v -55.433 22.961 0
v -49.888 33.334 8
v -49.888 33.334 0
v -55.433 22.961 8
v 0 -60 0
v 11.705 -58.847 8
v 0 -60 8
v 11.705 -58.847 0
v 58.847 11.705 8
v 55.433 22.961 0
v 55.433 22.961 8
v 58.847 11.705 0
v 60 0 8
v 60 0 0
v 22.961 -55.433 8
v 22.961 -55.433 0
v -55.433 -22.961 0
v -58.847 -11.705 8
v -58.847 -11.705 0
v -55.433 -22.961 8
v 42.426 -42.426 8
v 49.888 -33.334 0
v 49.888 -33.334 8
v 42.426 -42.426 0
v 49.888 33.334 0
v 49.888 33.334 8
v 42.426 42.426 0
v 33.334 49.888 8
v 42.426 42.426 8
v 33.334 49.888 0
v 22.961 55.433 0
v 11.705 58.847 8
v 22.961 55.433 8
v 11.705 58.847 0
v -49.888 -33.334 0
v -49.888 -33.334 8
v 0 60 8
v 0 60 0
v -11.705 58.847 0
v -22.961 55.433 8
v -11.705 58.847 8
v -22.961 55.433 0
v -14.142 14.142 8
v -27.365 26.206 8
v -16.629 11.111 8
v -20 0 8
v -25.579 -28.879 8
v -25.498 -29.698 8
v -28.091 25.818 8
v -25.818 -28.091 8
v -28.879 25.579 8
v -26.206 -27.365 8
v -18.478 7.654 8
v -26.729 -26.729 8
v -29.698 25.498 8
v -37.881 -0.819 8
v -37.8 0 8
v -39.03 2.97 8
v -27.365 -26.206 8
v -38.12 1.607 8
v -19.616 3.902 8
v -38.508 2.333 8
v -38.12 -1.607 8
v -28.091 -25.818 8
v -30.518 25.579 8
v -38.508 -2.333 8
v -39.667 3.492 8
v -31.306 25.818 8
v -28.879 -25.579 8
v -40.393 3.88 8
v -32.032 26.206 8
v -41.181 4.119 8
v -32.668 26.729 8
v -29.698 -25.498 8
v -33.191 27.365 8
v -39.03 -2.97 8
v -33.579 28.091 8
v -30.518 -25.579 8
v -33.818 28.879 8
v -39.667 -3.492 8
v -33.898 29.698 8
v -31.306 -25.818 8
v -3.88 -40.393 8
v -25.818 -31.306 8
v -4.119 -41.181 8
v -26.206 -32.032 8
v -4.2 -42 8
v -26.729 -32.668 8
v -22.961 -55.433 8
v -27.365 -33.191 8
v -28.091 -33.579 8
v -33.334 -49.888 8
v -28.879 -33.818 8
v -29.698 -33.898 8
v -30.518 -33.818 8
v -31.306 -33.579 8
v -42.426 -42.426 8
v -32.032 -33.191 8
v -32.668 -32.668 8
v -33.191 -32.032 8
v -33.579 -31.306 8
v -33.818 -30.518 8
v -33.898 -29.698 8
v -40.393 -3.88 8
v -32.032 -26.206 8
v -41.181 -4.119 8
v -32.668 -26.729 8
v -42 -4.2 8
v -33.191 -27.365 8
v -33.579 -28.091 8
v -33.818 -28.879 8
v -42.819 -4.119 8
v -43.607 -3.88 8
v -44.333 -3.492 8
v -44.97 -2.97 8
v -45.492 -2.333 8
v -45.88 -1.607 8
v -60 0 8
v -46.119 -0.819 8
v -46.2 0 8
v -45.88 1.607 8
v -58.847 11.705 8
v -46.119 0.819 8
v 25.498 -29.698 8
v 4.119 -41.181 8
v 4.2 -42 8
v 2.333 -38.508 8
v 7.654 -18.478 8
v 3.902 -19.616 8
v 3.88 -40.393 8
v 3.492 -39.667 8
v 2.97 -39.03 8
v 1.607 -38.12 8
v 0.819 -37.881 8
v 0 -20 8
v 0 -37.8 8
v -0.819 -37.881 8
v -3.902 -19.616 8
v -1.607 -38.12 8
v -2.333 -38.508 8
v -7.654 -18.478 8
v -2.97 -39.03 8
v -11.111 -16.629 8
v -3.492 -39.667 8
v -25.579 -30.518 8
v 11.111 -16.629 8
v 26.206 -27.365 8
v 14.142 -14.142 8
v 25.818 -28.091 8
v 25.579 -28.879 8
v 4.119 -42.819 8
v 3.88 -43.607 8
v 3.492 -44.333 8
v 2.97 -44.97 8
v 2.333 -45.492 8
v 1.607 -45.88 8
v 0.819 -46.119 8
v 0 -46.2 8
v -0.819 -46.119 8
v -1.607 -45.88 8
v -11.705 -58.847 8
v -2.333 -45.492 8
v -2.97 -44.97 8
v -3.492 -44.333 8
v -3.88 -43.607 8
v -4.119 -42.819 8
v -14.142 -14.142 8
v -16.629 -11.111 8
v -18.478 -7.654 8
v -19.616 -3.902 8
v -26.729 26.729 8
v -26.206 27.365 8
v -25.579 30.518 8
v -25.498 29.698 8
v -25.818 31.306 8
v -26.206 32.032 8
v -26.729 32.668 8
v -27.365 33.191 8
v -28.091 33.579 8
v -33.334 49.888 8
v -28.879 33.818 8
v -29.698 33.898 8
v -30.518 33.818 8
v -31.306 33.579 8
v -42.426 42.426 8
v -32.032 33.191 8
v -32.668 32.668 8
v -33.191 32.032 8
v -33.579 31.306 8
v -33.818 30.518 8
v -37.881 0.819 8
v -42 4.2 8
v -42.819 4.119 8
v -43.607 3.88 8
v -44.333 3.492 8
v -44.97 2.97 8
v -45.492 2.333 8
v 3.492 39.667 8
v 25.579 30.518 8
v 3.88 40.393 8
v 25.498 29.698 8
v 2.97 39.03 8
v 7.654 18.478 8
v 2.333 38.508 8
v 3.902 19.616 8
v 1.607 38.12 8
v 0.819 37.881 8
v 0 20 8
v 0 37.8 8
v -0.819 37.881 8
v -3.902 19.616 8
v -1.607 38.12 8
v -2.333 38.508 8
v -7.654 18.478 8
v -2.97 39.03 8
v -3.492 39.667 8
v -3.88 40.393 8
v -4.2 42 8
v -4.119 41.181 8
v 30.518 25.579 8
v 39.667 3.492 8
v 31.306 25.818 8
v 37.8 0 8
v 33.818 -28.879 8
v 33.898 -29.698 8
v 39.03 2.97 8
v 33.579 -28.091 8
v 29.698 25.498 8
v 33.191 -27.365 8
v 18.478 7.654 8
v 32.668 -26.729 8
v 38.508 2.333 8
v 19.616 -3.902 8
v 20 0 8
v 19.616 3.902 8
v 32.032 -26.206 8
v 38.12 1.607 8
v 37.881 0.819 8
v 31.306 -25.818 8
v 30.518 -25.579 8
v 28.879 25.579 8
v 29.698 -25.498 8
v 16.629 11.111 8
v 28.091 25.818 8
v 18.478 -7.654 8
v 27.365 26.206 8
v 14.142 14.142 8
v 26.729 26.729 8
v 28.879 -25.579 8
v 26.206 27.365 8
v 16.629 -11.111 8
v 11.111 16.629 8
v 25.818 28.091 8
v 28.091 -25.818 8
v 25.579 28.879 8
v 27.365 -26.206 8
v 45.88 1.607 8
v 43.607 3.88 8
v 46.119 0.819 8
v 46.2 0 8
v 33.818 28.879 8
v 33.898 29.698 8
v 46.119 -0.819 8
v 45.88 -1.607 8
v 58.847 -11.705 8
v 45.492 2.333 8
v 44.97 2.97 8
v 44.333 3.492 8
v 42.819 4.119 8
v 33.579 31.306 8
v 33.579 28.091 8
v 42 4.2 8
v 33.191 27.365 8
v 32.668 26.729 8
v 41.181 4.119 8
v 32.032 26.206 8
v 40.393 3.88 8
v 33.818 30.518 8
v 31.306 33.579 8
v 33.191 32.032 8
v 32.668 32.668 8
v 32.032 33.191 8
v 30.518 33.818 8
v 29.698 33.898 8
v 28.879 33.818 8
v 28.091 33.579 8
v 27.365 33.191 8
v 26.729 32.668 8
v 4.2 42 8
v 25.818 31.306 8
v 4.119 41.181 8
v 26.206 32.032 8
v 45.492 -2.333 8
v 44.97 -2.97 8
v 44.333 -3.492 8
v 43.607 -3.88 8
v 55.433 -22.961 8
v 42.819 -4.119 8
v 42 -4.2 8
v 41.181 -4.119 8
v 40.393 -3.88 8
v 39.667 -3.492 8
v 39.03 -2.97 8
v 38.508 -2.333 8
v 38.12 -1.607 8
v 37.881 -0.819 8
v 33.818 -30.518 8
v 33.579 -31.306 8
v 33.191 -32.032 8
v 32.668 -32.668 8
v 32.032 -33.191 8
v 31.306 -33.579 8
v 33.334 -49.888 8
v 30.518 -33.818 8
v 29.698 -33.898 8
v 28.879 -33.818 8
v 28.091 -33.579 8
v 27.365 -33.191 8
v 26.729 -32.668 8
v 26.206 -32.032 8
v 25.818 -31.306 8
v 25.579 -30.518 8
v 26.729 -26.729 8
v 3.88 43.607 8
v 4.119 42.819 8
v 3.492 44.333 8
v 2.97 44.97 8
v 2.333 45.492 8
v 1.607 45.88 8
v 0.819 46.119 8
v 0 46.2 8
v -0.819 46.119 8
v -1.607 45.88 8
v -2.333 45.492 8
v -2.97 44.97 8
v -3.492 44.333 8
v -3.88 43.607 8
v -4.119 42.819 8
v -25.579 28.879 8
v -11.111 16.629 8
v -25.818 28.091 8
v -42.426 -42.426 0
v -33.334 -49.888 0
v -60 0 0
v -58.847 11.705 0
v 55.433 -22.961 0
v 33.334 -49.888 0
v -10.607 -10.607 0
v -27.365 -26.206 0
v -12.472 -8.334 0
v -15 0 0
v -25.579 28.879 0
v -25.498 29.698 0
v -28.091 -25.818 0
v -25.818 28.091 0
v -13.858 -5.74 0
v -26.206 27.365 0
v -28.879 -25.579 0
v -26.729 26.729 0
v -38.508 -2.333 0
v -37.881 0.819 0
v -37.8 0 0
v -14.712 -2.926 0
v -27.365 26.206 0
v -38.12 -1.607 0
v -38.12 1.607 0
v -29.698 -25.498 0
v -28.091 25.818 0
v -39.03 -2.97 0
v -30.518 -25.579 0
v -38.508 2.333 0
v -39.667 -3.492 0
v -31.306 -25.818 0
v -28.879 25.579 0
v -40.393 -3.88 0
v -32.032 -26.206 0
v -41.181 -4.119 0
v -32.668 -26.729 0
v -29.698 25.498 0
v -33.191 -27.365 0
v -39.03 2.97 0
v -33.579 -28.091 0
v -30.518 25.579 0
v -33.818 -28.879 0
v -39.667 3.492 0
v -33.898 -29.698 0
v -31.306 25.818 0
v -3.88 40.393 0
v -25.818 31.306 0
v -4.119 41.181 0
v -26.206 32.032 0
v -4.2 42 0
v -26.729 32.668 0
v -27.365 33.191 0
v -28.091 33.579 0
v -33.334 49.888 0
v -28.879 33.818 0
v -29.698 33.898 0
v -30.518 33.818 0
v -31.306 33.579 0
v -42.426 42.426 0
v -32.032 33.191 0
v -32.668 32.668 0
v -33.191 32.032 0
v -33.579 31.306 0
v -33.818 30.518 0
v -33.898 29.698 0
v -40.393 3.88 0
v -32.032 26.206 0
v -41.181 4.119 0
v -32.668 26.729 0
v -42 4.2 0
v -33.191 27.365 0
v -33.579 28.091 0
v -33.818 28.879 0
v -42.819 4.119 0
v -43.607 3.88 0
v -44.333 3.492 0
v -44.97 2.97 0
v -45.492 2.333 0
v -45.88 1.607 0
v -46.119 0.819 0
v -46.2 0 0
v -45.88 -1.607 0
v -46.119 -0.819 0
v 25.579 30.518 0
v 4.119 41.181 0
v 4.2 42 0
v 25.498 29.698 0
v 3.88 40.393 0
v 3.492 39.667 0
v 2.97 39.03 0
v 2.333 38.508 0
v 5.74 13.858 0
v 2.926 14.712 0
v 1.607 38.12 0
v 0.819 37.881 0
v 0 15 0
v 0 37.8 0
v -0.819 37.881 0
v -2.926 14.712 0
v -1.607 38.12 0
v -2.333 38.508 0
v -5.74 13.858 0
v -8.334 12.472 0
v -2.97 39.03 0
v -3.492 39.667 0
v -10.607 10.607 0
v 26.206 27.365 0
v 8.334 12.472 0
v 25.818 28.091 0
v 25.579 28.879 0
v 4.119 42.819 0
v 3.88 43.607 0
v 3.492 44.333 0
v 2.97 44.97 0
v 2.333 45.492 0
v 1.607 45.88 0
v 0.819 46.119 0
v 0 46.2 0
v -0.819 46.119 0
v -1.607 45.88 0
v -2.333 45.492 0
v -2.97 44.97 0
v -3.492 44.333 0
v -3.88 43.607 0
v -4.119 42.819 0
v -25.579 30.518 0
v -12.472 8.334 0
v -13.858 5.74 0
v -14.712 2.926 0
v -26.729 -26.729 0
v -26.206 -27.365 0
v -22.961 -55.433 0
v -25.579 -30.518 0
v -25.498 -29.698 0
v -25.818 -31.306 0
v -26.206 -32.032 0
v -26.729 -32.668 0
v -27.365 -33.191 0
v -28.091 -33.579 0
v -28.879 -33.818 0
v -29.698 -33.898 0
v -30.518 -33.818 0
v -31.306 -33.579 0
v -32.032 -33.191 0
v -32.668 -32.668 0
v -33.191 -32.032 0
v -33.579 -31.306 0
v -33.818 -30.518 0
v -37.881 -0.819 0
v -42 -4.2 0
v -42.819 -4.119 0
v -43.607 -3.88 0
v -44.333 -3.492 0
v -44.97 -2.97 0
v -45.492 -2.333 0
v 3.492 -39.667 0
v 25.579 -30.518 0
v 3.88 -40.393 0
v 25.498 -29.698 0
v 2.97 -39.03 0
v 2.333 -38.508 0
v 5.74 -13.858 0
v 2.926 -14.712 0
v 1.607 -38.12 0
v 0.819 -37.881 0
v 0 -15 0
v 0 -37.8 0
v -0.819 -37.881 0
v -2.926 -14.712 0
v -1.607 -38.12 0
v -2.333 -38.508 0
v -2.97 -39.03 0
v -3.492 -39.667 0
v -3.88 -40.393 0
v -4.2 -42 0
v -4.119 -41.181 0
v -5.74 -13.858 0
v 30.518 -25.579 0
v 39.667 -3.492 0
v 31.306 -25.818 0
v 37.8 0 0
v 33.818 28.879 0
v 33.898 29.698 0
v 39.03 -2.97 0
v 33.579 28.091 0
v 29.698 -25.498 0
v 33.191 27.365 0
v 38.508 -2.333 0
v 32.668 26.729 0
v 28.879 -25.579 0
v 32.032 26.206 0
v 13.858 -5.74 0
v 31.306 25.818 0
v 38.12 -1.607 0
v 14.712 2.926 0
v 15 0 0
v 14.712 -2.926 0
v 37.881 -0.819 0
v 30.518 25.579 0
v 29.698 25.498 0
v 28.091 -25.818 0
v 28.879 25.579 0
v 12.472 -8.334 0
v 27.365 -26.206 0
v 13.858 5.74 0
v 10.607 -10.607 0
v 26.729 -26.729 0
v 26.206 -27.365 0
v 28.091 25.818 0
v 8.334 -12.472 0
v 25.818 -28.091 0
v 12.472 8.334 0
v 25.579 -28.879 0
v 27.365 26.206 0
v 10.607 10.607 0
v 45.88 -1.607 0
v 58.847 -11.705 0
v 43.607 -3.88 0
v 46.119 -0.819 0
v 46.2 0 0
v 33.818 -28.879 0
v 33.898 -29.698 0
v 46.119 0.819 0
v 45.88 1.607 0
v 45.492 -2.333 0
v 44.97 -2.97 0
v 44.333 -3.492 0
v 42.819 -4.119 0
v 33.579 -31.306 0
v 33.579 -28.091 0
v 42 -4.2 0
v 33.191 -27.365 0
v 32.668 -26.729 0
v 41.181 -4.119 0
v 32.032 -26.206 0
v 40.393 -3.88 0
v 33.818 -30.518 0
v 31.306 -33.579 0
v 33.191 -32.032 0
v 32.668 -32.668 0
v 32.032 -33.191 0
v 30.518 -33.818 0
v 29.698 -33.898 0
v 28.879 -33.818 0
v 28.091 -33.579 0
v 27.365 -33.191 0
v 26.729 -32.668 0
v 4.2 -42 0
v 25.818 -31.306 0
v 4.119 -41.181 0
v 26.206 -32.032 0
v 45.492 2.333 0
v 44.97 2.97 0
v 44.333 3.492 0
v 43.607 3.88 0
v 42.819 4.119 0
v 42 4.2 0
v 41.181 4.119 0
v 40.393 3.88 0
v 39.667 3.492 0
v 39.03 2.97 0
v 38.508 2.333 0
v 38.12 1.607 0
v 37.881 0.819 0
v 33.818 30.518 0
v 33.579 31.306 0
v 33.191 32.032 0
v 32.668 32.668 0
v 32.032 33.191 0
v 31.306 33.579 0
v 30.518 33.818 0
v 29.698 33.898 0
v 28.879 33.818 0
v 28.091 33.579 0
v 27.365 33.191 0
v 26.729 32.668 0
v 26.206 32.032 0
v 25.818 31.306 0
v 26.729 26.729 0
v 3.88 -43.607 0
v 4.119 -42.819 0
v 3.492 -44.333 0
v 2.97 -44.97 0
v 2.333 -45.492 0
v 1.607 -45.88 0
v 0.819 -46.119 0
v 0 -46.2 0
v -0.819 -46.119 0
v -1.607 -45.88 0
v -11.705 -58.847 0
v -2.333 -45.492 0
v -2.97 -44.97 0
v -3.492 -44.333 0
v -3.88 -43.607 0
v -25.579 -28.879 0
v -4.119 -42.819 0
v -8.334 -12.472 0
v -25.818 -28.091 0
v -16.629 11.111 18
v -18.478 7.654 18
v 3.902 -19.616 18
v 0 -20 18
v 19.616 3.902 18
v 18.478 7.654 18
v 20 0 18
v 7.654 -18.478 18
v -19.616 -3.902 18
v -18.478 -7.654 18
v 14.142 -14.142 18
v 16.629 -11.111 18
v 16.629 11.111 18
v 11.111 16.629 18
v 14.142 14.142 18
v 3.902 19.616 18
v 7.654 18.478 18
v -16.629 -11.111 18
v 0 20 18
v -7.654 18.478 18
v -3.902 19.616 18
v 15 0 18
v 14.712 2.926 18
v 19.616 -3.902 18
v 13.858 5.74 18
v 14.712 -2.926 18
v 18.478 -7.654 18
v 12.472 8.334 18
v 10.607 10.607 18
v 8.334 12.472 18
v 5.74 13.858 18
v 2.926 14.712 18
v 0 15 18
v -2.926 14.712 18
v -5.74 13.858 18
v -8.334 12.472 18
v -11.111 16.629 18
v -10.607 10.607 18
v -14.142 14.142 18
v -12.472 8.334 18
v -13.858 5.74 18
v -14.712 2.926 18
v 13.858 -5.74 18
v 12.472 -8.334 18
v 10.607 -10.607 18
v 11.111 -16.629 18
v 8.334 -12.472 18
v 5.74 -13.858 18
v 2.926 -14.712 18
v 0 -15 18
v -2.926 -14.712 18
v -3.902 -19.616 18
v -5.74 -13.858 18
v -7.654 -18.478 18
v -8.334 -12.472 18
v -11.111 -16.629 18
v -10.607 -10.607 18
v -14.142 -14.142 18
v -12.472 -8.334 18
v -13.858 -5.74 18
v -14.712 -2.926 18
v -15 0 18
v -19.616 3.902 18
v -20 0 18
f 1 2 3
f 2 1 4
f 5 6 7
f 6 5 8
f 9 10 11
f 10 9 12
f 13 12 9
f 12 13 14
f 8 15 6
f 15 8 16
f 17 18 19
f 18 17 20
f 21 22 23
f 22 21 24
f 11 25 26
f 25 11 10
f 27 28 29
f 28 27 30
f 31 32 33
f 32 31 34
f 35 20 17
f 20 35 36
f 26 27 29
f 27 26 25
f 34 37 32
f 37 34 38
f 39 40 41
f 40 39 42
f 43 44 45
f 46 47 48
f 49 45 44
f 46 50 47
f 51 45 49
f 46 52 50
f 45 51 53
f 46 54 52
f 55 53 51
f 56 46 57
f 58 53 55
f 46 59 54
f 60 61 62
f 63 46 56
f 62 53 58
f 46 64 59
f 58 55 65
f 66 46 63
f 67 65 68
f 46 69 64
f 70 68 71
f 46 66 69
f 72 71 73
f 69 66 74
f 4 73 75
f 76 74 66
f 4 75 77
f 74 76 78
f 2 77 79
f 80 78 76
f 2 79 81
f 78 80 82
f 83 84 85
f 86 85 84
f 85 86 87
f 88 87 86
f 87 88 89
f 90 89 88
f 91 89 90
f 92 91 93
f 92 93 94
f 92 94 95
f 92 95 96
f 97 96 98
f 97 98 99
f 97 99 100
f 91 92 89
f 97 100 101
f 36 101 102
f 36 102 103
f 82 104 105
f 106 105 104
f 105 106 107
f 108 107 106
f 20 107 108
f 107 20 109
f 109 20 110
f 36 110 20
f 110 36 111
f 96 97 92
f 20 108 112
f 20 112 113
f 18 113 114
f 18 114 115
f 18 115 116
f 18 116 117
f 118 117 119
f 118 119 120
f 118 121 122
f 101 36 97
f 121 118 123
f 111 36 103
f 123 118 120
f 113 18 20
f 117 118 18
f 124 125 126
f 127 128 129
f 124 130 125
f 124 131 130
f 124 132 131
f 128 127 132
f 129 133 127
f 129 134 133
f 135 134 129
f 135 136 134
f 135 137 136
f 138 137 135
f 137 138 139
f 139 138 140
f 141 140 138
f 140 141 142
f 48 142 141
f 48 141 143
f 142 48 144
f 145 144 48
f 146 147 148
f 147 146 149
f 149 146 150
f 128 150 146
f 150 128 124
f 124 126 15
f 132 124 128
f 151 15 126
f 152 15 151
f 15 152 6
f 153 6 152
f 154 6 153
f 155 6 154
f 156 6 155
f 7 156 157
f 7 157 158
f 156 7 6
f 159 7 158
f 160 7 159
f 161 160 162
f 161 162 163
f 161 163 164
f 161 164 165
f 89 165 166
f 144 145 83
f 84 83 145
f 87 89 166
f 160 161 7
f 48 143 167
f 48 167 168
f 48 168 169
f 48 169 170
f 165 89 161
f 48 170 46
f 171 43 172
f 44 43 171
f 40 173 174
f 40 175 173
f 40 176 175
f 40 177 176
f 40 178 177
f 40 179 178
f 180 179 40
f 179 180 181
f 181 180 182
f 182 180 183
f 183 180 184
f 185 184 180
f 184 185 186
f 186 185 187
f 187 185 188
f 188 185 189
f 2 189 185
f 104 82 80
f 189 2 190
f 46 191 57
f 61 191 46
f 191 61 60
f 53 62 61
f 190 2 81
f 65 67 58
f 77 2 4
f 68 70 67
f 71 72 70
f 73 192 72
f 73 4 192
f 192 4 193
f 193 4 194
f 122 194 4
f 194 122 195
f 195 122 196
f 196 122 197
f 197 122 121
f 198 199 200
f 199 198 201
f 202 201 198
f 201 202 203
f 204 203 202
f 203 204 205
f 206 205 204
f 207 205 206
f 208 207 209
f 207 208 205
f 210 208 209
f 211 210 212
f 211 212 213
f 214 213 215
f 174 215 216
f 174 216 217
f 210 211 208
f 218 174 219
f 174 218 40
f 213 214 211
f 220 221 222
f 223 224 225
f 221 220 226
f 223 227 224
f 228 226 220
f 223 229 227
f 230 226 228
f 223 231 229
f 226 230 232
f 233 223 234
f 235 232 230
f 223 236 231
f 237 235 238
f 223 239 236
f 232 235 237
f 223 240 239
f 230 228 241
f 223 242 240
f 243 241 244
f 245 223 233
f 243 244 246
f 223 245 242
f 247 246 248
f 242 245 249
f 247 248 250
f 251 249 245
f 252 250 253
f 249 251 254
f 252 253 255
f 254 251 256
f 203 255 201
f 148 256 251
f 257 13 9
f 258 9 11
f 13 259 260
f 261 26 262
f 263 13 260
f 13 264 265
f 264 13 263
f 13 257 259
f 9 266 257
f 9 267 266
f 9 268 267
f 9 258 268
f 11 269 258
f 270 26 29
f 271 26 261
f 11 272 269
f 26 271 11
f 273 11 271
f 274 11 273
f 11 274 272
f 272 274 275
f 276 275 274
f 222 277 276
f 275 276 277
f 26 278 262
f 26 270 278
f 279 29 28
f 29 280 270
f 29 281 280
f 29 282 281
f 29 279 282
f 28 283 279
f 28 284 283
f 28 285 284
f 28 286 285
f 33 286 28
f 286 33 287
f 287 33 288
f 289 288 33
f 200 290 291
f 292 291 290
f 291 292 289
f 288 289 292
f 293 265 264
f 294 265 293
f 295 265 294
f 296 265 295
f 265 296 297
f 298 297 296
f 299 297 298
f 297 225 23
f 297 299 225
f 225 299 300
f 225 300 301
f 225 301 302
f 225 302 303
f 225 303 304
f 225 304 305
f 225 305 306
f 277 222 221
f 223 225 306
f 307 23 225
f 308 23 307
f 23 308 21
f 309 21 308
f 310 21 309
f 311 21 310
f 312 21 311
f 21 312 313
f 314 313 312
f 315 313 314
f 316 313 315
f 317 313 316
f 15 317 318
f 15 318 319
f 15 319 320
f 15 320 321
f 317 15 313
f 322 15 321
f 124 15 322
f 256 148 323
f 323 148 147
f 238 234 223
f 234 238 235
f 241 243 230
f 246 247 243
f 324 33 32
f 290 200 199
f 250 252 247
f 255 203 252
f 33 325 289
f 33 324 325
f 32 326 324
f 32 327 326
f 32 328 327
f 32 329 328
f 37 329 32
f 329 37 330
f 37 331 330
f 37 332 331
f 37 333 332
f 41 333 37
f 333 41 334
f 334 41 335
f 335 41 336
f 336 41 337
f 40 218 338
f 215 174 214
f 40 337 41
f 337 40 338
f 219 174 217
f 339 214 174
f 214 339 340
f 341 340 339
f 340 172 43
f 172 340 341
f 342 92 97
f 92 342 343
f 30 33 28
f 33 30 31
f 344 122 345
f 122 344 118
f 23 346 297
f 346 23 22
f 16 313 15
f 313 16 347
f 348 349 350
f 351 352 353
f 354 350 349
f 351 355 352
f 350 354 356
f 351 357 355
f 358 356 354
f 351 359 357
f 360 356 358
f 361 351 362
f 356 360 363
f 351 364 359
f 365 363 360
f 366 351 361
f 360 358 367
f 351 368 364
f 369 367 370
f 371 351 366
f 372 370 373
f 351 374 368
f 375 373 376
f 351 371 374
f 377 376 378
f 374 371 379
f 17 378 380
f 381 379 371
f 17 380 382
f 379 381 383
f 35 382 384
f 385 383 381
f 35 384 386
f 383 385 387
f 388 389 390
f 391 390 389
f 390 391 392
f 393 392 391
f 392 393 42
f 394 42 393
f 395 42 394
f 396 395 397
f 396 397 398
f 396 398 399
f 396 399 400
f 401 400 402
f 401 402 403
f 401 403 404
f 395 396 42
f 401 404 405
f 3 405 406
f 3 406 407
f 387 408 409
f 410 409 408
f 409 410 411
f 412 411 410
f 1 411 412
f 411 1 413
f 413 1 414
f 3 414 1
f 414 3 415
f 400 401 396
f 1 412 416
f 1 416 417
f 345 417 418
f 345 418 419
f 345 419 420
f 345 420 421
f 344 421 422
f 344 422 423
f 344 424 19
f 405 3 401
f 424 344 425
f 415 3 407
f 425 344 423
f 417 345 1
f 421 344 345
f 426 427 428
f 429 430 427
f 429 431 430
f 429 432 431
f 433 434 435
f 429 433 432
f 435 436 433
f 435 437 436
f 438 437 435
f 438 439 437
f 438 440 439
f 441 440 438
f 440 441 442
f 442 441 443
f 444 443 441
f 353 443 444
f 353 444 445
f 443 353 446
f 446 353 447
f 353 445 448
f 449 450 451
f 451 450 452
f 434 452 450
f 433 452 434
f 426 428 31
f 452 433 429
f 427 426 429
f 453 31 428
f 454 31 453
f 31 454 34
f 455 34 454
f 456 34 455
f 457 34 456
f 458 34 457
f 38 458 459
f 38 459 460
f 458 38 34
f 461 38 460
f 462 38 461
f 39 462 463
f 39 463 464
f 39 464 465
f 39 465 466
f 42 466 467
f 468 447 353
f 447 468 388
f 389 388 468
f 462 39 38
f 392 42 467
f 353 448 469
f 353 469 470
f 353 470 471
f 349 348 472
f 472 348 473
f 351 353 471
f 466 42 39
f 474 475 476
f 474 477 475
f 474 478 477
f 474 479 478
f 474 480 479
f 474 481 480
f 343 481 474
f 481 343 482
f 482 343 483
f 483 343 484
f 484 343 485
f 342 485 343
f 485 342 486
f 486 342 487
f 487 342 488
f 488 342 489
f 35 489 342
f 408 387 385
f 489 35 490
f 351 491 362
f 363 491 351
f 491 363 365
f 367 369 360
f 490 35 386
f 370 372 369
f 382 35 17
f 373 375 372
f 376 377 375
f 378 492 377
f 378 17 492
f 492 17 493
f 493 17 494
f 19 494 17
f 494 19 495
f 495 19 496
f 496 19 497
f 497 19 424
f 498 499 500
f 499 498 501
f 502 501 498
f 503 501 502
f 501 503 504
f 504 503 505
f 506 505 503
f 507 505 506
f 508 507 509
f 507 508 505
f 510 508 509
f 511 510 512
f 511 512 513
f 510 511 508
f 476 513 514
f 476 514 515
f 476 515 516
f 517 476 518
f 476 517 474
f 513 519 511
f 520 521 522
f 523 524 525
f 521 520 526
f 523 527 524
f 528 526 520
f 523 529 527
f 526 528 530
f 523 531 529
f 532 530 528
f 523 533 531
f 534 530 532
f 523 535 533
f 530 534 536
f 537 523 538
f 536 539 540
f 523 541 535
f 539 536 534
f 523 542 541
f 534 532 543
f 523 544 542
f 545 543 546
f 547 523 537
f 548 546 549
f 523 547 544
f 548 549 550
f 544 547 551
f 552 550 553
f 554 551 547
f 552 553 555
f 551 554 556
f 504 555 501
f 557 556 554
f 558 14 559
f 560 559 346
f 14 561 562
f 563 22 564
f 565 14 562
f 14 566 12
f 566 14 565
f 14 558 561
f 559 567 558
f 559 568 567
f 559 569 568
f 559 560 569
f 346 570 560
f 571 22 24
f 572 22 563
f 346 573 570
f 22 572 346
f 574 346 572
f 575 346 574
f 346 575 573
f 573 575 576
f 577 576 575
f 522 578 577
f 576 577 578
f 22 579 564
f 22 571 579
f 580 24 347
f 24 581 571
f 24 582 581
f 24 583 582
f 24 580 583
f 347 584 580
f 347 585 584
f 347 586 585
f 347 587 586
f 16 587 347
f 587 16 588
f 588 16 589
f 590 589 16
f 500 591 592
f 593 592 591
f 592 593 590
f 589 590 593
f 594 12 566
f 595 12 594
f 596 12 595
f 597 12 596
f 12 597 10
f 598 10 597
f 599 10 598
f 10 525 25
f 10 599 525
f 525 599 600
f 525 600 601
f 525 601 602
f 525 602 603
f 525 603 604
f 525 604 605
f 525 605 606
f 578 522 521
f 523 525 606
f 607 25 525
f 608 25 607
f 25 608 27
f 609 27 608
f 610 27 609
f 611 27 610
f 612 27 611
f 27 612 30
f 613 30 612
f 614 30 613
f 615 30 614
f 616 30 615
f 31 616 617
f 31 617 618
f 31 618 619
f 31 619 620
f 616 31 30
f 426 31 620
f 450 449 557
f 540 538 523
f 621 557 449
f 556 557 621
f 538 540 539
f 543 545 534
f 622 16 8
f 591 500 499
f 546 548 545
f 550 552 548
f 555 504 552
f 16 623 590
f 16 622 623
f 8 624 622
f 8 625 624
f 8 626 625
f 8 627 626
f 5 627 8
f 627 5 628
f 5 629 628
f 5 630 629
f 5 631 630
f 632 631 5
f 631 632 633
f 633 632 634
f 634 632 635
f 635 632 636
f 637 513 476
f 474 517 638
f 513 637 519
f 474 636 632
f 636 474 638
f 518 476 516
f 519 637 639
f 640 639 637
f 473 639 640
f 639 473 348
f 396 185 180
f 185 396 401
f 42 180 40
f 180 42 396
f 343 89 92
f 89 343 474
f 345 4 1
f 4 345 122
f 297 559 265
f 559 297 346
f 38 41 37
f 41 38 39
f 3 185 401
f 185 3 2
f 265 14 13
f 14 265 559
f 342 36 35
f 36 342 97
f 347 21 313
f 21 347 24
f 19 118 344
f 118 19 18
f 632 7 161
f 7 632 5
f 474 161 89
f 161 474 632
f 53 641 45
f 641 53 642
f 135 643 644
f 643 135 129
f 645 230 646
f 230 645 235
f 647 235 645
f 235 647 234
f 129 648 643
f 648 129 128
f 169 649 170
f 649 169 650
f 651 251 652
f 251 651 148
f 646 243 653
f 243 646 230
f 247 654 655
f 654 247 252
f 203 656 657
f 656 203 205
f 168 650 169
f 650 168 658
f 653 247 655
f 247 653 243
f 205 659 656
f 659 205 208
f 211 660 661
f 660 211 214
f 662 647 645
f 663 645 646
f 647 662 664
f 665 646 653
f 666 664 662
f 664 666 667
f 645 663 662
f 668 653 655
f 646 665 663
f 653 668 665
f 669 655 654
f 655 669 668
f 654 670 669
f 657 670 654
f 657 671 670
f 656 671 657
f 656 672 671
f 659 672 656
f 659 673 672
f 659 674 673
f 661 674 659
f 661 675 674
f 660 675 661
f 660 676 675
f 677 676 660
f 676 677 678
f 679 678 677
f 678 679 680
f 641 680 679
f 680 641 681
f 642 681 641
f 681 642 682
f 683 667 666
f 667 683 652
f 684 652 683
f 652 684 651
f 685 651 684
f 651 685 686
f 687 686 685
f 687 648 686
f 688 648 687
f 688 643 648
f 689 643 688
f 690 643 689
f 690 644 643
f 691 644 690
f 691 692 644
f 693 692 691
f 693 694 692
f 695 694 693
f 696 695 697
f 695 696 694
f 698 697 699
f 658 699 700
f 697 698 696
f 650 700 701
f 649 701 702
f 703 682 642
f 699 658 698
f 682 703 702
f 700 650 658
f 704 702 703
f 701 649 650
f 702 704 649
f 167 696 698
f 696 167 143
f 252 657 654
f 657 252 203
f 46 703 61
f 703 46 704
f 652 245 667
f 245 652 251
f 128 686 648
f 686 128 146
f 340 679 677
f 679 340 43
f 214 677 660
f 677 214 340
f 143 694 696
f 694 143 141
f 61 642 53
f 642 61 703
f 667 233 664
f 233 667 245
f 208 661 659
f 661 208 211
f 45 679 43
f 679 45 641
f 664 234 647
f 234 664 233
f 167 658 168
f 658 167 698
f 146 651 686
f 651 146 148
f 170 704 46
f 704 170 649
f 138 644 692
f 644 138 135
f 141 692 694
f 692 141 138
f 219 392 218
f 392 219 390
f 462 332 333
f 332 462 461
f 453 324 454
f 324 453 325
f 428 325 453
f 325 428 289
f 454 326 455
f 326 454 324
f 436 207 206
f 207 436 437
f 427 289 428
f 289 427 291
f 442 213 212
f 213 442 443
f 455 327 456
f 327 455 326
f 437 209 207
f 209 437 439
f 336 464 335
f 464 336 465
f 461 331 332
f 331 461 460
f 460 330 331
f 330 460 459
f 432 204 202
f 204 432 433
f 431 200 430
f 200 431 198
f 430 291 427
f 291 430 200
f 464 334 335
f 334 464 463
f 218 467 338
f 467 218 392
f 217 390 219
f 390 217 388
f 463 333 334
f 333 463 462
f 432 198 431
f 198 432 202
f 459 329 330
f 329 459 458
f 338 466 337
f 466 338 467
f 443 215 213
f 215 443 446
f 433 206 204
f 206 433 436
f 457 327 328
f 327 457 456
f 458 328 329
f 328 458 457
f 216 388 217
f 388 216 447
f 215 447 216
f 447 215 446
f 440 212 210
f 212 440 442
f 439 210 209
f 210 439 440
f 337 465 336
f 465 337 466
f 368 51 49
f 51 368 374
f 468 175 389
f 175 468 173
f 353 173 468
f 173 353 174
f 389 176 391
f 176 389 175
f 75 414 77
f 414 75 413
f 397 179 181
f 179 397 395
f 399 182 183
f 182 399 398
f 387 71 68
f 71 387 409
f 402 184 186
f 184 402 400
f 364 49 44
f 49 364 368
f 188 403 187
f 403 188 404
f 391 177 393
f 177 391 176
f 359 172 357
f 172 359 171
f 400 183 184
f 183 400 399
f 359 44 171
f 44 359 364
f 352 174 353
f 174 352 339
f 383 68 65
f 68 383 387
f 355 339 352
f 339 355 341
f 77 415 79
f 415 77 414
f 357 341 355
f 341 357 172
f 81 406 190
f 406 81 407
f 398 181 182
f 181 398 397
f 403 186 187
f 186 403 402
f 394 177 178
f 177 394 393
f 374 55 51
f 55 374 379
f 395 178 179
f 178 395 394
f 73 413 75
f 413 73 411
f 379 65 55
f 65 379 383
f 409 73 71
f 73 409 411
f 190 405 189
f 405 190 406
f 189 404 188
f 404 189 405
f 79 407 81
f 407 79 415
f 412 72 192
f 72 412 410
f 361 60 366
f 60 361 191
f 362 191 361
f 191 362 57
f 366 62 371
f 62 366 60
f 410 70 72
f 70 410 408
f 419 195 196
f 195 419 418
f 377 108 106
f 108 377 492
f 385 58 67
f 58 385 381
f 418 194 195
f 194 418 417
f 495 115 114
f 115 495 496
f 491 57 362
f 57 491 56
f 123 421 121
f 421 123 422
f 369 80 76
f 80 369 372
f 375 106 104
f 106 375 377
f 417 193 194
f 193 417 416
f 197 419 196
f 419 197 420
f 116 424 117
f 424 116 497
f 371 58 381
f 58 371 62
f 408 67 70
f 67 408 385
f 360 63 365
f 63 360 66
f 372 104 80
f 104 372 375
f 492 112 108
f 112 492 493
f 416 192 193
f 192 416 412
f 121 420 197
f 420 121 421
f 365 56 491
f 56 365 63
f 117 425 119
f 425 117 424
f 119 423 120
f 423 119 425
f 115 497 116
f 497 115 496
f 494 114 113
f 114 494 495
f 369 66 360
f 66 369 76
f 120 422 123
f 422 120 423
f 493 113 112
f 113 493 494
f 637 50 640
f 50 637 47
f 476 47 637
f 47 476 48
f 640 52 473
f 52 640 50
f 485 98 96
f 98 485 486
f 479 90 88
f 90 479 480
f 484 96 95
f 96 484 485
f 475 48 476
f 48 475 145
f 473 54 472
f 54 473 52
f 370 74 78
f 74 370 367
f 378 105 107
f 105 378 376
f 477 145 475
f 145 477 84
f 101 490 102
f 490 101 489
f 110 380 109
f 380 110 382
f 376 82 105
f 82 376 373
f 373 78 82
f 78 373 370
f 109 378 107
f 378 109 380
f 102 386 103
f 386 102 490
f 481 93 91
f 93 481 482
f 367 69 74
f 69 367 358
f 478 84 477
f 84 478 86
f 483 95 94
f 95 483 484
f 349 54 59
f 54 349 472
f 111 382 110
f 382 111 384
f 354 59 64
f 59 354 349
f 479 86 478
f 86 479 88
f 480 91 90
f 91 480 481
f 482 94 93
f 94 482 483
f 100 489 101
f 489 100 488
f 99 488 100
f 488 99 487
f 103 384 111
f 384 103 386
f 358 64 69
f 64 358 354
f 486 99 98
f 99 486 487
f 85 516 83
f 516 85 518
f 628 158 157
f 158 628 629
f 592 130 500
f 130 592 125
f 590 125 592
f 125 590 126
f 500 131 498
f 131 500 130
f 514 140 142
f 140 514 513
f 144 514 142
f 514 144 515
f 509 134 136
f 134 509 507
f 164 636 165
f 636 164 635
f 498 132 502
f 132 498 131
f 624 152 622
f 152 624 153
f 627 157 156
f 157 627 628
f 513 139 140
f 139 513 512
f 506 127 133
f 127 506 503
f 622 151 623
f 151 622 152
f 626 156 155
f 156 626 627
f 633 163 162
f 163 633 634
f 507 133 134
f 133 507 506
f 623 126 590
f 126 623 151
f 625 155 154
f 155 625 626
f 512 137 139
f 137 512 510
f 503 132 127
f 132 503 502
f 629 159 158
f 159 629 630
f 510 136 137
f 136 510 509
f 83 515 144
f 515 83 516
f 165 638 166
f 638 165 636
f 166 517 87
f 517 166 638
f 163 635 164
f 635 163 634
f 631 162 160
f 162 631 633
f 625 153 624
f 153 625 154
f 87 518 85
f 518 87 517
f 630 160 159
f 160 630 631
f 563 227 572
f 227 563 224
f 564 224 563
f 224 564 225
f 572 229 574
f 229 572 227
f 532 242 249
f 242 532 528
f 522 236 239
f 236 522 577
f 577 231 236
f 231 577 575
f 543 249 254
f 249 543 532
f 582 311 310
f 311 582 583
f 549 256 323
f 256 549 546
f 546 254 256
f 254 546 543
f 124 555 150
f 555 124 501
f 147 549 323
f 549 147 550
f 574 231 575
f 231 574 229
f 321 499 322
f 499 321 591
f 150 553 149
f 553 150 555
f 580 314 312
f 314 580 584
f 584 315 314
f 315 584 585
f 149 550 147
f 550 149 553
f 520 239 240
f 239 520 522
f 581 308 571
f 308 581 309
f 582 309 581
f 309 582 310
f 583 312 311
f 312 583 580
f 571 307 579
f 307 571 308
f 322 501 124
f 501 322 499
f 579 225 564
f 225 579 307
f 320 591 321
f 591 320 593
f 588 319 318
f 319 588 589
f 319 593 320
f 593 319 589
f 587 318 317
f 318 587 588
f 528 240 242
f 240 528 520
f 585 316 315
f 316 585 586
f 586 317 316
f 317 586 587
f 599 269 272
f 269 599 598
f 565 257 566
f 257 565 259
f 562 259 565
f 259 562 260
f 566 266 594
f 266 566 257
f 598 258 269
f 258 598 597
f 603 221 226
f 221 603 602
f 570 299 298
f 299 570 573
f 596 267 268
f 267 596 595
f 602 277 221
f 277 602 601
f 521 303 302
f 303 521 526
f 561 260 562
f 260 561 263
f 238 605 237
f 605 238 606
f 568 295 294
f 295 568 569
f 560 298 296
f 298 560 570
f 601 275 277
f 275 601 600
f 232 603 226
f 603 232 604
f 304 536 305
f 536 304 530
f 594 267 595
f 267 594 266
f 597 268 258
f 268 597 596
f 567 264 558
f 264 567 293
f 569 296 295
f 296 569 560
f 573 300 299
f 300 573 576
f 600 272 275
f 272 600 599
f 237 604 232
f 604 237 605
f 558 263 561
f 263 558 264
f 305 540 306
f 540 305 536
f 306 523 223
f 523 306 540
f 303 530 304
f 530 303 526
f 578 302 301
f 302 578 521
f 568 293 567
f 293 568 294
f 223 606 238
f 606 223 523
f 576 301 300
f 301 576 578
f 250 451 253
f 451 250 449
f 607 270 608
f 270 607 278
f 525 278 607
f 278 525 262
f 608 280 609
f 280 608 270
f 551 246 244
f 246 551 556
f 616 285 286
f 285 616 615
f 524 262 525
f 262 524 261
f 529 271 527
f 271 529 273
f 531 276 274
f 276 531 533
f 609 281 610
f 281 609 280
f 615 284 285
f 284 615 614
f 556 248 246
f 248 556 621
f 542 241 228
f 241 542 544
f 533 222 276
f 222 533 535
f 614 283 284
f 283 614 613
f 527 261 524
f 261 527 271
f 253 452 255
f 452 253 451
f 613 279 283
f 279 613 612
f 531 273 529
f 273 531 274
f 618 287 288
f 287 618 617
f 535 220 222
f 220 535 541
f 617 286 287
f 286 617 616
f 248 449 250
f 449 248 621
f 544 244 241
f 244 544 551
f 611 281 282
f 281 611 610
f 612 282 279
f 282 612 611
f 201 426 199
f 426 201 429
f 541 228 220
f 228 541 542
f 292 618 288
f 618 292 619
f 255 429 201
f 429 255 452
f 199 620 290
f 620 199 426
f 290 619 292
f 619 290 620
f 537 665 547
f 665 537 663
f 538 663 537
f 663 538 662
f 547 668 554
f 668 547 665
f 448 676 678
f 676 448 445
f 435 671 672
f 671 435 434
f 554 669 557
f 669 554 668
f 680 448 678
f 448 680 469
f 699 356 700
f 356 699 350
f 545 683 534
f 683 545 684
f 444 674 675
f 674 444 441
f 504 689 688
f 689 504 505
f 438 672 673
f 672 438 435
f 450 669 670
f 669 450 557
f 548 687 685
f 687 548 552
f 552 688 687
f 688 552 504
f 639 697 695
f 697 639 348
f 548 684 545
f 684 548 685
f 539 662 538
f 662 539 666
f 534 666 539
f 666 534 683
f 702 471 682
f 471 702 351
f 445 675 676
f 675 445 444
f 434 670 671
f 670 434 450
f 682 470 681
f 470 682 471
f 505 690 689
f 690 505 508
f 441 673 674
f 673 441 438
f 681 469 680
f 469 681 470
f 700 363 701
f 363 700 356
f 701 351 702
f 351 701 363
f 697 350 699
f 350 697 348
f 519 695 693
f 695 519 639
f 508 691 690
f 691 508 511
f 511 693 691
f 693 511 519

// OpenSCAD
$fn = 32;

// ----------------------------------------------------------------------
// Flange Ø120 x 8
// 8 holes on a Ø84 bolt circle, bolted joints
// ----------------------------------------------------------------------

// --- parameters (mm) ---
flange_d = 120;  // outside diameter of the flange
thickness = 8;   // flange thickness
holes = 8;       // number of bolt holes
pcd = 84;        // bolt circle diameter
start_deg = 90;  // angle of the first hole, from +X
hole_d = 8.4;    // bolt hole diameter
bore_d = 30;     // central through bore
hub_d = 40;      // hub outside diameter
hub_h = 10;      // hub height above the flange face (0 = no hub)

// --- derived feature positions (mm) ---
height = thickness + hub_h;  // = 18   overall height of the part
pcd_r = pcd / 2;             // = 42   bolt circle radius
hole_step = 360 / holes;     // = 45   angular pitch
feature_centers = [
  [pcd_r * cos(start_deg + 0 * hole_step), pcd_r * sin(start_deg + 0 * hole_step)],
  [pcd_r * cos(start_deg + 1 * hole_step), pcd_r * sin(start_deg + 1 * hole_step)],
  [pcd_r * cos(start_deg + 2 * hole_step), pcd_r * sin(start_deg + 2 * hole_step)],
  [pcd_r * cos(start_deg + 3 * hole_step), pcd_r * sin(start_deg + 3 * hole_step)],
  [pcd_r * cos(start_deg + 4 * hole_step), pcd_r * sin(start_deg + 4 * hole_step)],
  [pcd_r * cos(start_deg + 5 * hole_step), pcd_r * sin(start_deg + 5 * hole_step)],
  [pcd_r * cos(start_deg + 6 * hole_step), pcd_r * sin(start_deg + 6 * hole_step)],
  [pcd_r * cos(start_deg + 7 * hole_step), pcd_r * sin(start_deg + 7 * hole_step)]
];   // bolt hole centres on the pitch circle

// flange disc, every hole and the bore cut straight through
difference() {
  union() {
    cylinder(d = flange_d, h = thickness);
    cylinder(d = hub_d, h = height);  // hub, overlapped into the flange
  }
  translate([0, 0, -1]) cylinder(d = bore_d, h = height + 2);  // bore, through
  for (centre = feature_centers)
    translate([centre[0], centre[1], -1]) cylinder(d = hole_d, h = thickness + 2);
}
